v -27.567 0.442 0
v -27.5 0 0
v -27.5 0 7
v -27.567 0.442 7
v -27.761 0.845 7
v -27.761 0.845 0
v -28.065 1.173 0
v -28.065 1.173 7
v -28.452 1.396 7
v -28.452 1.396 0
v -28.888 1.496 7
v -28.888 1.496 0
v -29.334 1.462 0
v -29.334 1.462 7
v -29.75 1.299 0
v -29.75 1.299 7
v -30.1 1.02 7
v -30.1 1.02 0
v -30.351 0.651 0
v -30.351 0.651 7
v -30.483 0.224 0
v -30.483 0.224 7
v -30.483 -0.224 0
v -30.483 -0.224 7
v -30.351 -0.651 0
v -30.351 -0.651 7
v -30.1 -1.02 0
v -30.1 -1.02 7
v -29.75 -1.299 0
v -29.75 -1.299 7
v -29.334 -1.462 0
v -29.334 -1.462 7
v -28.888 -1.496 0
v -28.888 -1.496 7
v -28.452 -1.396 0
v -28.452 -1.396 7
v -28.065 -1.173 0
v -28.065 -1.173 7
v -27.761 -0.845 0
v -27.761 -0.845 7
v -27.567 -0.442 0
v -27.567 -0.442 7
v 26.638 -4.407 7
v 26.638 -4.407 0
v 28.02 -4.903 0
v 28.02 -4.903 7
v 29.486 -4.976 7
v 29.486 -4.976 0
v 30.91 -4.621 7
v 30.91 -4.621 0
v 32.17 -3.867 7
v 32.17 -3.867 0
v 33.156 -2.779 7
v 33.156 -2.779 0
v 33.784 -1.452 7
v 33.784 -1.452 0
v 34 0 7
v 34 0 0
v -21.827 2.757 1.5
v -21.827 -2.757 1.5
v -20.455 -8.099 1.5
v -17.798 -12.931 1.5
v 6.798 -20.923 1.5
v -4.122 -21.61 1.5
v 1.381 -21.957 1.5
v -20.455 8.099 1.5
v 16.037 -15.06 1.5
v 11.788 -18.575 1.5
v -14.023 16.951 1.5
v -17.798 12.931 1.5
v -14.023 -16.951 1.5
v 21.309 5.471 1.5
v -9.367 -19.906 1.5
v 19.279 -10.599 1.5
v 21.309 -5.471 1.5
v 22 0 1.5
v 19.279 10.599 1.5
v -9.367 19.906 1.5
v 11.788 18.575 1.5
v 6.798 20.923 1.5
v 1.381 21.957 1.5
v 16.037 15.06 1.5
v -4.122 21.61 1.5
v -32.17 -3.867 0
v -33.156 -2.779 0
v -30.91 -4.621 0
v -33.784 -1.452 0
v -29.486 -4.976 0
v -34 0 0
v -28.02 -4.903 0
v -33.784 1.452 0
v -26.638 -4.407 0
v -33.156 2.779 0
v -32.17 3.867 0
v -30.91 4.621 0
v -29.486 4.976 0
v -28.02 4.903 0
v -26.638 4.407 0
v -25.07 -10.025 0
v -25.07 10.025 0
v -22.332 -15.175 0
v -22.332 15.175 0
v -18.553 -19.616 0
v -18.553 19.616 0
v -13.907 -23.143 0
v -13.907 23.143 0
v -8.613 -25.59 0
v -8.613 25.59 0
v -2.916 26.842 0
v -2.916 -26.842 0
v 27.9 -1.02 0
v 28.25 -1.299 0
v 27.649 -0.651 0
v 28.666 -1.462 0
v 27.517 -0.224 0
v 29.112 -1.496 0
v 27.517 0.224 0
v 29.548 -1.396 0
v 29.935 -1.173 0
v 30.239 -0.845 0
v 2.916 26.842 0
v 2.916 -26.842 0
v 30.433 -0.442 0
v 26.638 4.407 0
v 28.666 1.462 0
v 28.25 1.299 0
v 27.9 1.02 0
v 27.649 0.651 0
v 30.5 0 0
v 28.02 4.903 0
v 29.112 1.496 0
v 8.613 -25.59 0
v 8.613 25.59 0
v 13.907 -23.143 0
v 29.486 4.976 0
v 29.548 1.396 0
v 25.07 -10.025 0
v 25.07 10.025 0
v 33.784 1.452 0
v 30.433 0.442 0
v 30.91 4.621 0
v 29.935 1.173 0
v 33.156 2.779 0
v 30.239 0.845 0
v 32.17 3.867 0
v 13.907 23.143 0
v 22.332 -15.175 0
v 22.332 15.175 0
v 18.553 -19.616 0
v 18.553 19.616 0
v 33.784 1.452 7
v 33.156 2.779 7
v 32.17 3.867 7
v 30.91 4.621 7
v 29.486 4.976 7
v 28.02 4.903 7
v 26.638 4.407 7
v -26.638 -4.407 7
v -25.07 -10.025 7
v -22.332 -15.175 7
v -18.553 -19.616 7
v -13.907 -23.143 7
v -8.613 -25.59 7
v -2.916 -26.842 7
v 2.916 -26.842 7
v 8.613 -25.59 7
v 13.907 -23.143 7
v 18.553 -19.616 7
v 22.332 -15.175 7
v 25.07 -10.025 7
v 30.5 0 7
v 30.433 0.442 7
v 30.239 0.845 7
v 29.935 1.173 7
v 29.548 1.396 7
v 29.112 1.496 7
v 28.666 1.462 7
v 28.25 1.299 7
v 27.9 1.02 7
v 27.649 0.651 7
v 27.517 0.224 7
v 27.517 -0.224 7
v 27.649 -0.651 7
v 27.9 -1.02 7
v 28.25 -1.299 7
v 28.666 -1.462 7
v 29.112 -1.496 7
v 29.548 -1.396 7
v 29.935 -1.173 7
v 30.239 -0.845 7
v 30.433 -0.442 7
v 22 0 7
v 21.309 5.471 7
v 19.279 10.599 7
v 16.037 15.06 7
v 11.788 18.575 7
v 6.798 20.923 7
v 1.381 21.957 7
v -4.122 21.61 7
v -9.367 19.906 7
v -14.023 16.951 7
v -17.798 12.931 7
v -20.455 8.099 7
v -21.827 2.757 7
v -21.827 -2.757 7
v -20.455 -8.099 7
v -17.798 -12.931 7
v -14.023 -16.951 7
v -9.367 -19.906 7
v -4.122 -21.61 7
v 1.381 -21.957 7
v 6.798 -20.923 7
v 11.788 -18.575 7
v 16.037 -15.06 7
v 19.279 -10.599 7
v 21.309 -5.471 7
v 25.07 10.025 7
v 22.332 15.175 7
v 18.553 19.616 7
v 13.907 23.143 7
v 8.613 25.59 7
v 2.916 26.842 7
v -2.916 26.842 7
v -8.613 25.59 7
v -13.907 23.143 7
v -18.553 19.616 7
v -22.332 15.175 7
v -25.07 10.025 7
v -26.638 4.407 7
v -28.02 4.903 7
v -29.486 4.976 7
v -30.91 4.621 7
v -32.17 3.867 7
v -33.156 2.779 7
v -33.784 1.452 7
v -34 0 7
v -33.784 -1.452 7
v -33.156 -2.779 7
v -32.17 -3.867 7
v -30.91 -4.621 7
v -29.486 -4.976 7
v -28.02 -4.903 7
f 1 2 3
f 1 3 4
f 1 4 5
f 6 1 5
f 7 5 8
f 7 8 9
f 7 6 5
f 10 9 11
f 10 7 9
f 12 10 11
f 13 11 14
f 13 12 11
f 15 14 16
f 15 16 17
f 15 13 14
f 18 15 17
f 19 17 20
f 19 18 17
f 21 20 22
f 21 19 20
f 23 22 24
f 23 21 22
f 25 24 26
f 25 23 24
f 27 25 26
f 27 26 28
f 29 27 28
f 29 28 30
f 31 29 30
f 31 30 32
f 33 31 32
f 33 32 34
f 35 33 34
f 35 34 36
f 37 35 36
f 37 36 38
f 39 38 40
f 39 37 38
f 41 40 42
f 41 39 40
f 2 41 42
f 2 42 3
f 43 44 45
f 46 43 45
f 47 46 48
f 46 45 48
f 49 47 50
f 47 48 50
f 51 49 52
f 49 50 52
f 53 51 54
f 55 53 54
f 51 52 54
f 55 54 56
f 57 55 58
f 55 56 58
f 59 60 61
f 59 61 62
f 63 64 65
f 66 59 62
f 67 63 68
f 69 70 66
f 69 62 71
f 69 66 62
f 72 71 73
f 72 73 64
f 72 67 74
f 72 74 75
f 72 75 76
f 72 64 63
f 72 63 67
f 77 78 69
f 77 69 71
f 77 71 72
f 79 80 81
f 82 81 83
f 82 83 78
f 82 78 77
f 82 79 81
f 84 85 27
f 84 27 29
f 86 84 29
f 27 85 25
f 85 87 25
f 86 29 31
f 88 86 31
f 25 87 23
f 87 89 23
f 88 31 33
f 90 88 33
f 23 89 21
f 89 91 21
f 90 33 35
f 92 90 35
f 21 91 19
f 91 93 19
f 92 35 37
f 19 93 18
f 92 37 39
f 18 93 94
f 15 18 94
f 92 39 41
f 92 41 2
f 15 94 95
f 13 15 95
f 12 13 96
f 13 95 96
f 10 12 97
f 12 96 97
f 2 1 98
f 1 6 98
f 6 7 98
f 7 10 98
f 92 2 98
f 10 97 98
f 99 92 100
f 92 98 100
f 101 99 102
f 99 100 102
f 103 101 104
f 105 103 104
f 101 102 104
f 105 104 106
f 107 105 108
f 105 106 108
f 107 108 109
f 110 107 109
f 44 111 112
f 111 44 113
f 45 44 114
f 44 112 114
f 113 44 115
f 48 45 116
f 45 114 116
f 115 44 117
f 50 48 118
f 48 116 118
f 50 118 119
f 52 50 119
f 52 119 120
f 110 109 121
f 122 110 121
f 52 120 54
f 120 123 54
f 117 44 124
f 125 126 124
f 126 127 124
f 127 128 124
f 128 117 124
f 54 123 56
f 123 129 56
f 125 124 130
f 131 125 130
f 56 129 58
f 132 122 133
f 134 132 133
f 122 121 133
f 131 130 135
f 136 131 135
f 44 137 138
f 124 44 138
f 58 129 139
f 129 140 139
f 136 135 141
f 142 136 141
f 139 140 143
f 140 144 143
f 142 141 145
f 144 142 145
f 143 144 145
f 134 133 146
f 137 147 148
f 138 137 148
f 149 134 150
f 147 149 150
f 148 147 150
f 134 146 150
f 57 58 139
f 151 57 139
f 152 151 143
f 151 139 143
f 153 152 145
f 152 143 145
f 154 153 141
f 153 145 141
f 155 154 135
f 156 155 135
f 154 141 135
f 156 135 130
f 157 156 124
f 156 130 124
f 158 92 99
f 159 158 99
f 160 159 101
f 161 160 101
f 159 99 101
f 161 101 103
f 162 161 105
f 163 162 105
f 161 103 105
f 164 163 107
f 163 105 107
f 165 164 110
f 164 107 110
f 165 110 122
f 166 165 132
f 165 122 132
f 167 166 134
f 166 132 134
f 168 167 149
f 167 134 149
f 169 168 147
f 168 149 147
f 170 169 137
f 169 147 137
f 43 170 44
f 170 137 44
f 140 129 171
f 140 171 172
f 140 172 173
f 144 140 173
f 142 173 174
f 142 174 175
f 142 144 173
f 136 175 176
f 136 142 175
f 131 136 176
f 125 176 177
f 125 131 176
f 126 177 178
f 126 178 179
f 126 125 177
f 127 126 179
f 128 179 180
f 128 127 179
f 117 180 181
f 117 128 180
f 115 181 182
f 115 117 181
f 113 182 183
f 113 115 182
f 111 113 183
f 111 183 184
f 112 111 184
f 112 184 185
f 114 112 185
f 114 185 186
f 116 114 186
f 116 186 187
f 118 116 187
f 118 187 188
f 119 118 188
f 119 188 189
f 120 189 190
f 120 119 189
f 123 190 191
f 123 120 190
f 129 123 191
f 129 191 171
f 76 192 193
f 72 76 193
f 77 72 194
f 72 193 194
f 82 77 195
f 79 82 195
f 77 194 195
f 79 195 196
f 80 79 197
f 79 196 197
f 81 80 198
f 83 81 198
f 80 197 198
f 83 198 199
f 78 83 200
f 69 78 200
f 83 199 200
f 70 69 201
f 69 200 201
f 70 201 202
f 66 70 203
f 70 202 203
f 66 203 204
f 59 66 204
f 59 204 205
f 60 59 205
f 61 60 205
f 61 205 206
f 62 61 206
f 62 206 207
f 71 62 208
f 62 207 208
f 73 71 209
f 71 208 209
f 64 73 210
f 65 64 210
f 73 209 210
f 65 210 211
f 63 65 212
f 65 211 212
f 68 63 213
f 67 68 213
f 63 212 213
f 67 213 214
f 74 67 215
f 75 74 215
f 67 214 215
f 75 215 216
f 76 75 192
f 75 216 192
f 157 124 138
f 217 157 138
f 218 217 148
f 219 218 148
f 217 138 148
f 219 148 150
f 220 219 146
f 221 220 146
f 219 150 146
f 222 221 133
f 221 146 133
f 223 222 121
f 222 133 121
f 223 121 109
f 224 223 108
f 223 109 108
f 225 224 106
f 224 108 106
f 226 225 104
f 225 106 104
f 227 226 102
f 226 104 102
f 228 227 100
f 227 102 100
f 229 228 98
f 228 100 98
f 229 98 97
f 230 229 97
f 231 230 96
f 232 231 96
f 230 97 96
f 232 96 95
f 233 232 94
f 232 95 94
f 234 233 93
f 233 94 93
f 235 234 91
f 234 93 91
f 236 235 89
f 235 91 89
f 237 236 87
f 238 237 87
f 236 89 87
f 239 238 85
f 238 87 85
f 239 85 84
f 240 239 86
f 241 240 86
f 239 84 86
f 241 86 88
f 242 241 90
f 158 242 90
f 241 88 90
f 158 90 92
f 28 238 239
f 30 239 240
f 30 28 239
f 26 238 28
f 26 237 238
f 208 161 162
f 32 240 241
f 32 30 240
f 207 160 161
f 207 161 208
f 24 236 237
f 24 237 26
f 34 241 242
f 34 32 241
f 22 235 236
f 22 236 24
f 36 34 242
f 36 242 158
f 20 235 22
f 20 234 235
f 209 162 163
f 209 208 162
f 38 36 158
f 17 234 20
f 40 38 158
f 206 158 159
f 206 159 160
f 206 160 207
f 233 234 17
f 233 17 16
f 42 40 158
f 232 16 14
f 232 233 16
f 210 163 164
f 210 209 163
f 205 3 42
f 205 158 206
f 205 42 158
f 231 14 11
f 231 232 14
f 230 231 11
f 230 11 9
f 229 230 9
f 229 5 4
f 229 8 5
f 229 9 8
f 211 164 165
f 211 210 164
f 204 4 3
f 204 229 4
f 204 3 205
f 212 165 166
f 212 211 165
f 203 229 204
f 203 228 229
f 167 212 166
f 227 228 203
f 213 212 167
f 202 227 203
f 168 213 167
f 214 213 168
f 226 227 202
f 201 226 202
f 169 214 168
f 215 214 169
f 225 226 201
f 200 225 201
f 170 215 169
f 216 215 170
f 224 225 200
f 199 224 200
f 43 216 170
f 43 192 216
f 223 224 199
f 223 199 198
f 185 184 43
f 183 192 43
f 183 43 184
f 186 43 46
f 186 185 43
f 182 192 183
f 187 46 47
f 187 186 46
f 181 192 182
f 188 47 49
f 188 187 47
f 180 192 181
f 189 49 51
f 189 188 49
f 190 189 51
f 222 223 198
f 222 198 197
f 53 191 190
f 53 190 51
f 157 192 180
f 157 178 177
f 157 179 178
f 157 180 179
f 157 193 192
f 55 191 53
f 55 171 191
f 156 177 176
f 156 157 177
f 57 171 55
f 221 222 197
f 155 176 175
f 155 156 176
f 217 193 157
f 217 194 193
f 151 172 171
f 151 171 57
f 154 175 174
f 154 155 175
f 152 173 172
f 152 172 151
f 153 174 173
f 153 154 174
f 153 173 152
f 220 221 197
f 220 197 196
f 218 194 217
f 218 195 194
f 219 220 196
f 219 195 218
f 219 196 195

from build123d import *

# Parameters (mm, degrees)
F0_R     = 1.5
F1_DEPTH = 7
F2_DEPTH = 7
F3_R     = 22
F4_DEPTH = 5.5


with BuildPart() as f1:
    # F0 (on Top) → F1 (new body)
    with BuildSketch(Plane.XY):
        with BuildLine():
            ThreePointArc((-26.6379310345, -4.4068844099), (-27, 0), (-26.6379310345, 4.4068844099))
            ThreePointArc((-26.6379310345, 4.4068844099), (-34, 0), (-26.6379310345, -4.4068844099))
        make_face()
        with Locations((-29, 0)):
            Circle(F0_R, mode=Mode.SUBTRACT)
    extrude(amount=F1_DEPTH)



with BuildPart() as f1b:
    # F0 (on Top) → F1, piece 2 (new body)
    with BuildSketch(Plane.XY):
        with BuildLine():
            ThreePointArc((26.6379310345, 4.4068844099), (26.9093305187, 2.21086658), (27, 0))
            ThreePointArc((27, 0), (26.9093305187, -2.21086658), (26.6379310345, -4.4068844099))
            ThreePointArc((26.6379310345, -4.4068844099), (31.5680396388, -4.2901249881), (34, 0))
            ThreePointArc((34, 0), (31.5680396388, 4.2901249881), (26.6379310345, 4.4068844099))
        make_face()
        with Locations((29, 0)):
            Circle(F0_R, mode=Mode.SUBTRACT)
    extrude(amount=F1_DEPTH)


with BuildPart() as f1_1:
    add(f1.part)

    add(f1b.part)  # F2 merges F1b
    # F0 (on Top) → F2 (join)
    with BuildSketch(Plane.XY):
        with BuildLine():
            ThreePointArc((-24, 0), (-24.7098750119, 2.5680396388), (-26.6379310345, 4.4068844099))
            ThreePointArc((-26.6379310345, 4.4068844099), (-27, 0), (-26.6379310345, -4.4068844099))
            ThreePointArc((-26.6379310345, -4.4068844099), (-24.7098750119, -2.5680396388), (-24, 0))
        make_face()
        with BuildLine():
            ThreePointArc((26.6379310345, -4.4068844099), (26.9093305187, -2.21086658), (27, 0))
            ThreePointArc((27, 0), (26.9093305187, 2.21086658), (26.6379310345, 4.4068844099))
            ThreePointArc((26.6379310345, 4.4068844099), (24, 0), (26.6379310345, -4.4068844099))
        make_face()
        with BuildLine():
            ThreePointArc((26.6379310345, -4.4068844099), (24, 0), (26.6379310345, 4.4068844099))
            ThreePointArc((26.6379310345, 4.4068844099), (0, 27), (-26.6379310345, 4.4068844099))
            ThreePointArc((-26.6379310345, 4.4068844099), (-24.7098750119, 2.5680396388), (-24, 0))
            ThreePointArc((-24, 0), (-24.7098750119, -2.5680396388), (-26.6379310345, -4.4068844099))
            ThreePointArc((-26.6379310345, -4.4068844099), (0, -27), (26.6379310345, -4.4068844099))
        make_face()
    extrude(amount=F2_DEPTH)

    # F3 (on face) → F4 (cut)
    with BuildSketch(Plane.XY.offset(7)):
        Circle(F3_R)
    extrude(amount=-F4_DEPTH, mode=Mode.SUBTRACT)


solid = f1_1.part
